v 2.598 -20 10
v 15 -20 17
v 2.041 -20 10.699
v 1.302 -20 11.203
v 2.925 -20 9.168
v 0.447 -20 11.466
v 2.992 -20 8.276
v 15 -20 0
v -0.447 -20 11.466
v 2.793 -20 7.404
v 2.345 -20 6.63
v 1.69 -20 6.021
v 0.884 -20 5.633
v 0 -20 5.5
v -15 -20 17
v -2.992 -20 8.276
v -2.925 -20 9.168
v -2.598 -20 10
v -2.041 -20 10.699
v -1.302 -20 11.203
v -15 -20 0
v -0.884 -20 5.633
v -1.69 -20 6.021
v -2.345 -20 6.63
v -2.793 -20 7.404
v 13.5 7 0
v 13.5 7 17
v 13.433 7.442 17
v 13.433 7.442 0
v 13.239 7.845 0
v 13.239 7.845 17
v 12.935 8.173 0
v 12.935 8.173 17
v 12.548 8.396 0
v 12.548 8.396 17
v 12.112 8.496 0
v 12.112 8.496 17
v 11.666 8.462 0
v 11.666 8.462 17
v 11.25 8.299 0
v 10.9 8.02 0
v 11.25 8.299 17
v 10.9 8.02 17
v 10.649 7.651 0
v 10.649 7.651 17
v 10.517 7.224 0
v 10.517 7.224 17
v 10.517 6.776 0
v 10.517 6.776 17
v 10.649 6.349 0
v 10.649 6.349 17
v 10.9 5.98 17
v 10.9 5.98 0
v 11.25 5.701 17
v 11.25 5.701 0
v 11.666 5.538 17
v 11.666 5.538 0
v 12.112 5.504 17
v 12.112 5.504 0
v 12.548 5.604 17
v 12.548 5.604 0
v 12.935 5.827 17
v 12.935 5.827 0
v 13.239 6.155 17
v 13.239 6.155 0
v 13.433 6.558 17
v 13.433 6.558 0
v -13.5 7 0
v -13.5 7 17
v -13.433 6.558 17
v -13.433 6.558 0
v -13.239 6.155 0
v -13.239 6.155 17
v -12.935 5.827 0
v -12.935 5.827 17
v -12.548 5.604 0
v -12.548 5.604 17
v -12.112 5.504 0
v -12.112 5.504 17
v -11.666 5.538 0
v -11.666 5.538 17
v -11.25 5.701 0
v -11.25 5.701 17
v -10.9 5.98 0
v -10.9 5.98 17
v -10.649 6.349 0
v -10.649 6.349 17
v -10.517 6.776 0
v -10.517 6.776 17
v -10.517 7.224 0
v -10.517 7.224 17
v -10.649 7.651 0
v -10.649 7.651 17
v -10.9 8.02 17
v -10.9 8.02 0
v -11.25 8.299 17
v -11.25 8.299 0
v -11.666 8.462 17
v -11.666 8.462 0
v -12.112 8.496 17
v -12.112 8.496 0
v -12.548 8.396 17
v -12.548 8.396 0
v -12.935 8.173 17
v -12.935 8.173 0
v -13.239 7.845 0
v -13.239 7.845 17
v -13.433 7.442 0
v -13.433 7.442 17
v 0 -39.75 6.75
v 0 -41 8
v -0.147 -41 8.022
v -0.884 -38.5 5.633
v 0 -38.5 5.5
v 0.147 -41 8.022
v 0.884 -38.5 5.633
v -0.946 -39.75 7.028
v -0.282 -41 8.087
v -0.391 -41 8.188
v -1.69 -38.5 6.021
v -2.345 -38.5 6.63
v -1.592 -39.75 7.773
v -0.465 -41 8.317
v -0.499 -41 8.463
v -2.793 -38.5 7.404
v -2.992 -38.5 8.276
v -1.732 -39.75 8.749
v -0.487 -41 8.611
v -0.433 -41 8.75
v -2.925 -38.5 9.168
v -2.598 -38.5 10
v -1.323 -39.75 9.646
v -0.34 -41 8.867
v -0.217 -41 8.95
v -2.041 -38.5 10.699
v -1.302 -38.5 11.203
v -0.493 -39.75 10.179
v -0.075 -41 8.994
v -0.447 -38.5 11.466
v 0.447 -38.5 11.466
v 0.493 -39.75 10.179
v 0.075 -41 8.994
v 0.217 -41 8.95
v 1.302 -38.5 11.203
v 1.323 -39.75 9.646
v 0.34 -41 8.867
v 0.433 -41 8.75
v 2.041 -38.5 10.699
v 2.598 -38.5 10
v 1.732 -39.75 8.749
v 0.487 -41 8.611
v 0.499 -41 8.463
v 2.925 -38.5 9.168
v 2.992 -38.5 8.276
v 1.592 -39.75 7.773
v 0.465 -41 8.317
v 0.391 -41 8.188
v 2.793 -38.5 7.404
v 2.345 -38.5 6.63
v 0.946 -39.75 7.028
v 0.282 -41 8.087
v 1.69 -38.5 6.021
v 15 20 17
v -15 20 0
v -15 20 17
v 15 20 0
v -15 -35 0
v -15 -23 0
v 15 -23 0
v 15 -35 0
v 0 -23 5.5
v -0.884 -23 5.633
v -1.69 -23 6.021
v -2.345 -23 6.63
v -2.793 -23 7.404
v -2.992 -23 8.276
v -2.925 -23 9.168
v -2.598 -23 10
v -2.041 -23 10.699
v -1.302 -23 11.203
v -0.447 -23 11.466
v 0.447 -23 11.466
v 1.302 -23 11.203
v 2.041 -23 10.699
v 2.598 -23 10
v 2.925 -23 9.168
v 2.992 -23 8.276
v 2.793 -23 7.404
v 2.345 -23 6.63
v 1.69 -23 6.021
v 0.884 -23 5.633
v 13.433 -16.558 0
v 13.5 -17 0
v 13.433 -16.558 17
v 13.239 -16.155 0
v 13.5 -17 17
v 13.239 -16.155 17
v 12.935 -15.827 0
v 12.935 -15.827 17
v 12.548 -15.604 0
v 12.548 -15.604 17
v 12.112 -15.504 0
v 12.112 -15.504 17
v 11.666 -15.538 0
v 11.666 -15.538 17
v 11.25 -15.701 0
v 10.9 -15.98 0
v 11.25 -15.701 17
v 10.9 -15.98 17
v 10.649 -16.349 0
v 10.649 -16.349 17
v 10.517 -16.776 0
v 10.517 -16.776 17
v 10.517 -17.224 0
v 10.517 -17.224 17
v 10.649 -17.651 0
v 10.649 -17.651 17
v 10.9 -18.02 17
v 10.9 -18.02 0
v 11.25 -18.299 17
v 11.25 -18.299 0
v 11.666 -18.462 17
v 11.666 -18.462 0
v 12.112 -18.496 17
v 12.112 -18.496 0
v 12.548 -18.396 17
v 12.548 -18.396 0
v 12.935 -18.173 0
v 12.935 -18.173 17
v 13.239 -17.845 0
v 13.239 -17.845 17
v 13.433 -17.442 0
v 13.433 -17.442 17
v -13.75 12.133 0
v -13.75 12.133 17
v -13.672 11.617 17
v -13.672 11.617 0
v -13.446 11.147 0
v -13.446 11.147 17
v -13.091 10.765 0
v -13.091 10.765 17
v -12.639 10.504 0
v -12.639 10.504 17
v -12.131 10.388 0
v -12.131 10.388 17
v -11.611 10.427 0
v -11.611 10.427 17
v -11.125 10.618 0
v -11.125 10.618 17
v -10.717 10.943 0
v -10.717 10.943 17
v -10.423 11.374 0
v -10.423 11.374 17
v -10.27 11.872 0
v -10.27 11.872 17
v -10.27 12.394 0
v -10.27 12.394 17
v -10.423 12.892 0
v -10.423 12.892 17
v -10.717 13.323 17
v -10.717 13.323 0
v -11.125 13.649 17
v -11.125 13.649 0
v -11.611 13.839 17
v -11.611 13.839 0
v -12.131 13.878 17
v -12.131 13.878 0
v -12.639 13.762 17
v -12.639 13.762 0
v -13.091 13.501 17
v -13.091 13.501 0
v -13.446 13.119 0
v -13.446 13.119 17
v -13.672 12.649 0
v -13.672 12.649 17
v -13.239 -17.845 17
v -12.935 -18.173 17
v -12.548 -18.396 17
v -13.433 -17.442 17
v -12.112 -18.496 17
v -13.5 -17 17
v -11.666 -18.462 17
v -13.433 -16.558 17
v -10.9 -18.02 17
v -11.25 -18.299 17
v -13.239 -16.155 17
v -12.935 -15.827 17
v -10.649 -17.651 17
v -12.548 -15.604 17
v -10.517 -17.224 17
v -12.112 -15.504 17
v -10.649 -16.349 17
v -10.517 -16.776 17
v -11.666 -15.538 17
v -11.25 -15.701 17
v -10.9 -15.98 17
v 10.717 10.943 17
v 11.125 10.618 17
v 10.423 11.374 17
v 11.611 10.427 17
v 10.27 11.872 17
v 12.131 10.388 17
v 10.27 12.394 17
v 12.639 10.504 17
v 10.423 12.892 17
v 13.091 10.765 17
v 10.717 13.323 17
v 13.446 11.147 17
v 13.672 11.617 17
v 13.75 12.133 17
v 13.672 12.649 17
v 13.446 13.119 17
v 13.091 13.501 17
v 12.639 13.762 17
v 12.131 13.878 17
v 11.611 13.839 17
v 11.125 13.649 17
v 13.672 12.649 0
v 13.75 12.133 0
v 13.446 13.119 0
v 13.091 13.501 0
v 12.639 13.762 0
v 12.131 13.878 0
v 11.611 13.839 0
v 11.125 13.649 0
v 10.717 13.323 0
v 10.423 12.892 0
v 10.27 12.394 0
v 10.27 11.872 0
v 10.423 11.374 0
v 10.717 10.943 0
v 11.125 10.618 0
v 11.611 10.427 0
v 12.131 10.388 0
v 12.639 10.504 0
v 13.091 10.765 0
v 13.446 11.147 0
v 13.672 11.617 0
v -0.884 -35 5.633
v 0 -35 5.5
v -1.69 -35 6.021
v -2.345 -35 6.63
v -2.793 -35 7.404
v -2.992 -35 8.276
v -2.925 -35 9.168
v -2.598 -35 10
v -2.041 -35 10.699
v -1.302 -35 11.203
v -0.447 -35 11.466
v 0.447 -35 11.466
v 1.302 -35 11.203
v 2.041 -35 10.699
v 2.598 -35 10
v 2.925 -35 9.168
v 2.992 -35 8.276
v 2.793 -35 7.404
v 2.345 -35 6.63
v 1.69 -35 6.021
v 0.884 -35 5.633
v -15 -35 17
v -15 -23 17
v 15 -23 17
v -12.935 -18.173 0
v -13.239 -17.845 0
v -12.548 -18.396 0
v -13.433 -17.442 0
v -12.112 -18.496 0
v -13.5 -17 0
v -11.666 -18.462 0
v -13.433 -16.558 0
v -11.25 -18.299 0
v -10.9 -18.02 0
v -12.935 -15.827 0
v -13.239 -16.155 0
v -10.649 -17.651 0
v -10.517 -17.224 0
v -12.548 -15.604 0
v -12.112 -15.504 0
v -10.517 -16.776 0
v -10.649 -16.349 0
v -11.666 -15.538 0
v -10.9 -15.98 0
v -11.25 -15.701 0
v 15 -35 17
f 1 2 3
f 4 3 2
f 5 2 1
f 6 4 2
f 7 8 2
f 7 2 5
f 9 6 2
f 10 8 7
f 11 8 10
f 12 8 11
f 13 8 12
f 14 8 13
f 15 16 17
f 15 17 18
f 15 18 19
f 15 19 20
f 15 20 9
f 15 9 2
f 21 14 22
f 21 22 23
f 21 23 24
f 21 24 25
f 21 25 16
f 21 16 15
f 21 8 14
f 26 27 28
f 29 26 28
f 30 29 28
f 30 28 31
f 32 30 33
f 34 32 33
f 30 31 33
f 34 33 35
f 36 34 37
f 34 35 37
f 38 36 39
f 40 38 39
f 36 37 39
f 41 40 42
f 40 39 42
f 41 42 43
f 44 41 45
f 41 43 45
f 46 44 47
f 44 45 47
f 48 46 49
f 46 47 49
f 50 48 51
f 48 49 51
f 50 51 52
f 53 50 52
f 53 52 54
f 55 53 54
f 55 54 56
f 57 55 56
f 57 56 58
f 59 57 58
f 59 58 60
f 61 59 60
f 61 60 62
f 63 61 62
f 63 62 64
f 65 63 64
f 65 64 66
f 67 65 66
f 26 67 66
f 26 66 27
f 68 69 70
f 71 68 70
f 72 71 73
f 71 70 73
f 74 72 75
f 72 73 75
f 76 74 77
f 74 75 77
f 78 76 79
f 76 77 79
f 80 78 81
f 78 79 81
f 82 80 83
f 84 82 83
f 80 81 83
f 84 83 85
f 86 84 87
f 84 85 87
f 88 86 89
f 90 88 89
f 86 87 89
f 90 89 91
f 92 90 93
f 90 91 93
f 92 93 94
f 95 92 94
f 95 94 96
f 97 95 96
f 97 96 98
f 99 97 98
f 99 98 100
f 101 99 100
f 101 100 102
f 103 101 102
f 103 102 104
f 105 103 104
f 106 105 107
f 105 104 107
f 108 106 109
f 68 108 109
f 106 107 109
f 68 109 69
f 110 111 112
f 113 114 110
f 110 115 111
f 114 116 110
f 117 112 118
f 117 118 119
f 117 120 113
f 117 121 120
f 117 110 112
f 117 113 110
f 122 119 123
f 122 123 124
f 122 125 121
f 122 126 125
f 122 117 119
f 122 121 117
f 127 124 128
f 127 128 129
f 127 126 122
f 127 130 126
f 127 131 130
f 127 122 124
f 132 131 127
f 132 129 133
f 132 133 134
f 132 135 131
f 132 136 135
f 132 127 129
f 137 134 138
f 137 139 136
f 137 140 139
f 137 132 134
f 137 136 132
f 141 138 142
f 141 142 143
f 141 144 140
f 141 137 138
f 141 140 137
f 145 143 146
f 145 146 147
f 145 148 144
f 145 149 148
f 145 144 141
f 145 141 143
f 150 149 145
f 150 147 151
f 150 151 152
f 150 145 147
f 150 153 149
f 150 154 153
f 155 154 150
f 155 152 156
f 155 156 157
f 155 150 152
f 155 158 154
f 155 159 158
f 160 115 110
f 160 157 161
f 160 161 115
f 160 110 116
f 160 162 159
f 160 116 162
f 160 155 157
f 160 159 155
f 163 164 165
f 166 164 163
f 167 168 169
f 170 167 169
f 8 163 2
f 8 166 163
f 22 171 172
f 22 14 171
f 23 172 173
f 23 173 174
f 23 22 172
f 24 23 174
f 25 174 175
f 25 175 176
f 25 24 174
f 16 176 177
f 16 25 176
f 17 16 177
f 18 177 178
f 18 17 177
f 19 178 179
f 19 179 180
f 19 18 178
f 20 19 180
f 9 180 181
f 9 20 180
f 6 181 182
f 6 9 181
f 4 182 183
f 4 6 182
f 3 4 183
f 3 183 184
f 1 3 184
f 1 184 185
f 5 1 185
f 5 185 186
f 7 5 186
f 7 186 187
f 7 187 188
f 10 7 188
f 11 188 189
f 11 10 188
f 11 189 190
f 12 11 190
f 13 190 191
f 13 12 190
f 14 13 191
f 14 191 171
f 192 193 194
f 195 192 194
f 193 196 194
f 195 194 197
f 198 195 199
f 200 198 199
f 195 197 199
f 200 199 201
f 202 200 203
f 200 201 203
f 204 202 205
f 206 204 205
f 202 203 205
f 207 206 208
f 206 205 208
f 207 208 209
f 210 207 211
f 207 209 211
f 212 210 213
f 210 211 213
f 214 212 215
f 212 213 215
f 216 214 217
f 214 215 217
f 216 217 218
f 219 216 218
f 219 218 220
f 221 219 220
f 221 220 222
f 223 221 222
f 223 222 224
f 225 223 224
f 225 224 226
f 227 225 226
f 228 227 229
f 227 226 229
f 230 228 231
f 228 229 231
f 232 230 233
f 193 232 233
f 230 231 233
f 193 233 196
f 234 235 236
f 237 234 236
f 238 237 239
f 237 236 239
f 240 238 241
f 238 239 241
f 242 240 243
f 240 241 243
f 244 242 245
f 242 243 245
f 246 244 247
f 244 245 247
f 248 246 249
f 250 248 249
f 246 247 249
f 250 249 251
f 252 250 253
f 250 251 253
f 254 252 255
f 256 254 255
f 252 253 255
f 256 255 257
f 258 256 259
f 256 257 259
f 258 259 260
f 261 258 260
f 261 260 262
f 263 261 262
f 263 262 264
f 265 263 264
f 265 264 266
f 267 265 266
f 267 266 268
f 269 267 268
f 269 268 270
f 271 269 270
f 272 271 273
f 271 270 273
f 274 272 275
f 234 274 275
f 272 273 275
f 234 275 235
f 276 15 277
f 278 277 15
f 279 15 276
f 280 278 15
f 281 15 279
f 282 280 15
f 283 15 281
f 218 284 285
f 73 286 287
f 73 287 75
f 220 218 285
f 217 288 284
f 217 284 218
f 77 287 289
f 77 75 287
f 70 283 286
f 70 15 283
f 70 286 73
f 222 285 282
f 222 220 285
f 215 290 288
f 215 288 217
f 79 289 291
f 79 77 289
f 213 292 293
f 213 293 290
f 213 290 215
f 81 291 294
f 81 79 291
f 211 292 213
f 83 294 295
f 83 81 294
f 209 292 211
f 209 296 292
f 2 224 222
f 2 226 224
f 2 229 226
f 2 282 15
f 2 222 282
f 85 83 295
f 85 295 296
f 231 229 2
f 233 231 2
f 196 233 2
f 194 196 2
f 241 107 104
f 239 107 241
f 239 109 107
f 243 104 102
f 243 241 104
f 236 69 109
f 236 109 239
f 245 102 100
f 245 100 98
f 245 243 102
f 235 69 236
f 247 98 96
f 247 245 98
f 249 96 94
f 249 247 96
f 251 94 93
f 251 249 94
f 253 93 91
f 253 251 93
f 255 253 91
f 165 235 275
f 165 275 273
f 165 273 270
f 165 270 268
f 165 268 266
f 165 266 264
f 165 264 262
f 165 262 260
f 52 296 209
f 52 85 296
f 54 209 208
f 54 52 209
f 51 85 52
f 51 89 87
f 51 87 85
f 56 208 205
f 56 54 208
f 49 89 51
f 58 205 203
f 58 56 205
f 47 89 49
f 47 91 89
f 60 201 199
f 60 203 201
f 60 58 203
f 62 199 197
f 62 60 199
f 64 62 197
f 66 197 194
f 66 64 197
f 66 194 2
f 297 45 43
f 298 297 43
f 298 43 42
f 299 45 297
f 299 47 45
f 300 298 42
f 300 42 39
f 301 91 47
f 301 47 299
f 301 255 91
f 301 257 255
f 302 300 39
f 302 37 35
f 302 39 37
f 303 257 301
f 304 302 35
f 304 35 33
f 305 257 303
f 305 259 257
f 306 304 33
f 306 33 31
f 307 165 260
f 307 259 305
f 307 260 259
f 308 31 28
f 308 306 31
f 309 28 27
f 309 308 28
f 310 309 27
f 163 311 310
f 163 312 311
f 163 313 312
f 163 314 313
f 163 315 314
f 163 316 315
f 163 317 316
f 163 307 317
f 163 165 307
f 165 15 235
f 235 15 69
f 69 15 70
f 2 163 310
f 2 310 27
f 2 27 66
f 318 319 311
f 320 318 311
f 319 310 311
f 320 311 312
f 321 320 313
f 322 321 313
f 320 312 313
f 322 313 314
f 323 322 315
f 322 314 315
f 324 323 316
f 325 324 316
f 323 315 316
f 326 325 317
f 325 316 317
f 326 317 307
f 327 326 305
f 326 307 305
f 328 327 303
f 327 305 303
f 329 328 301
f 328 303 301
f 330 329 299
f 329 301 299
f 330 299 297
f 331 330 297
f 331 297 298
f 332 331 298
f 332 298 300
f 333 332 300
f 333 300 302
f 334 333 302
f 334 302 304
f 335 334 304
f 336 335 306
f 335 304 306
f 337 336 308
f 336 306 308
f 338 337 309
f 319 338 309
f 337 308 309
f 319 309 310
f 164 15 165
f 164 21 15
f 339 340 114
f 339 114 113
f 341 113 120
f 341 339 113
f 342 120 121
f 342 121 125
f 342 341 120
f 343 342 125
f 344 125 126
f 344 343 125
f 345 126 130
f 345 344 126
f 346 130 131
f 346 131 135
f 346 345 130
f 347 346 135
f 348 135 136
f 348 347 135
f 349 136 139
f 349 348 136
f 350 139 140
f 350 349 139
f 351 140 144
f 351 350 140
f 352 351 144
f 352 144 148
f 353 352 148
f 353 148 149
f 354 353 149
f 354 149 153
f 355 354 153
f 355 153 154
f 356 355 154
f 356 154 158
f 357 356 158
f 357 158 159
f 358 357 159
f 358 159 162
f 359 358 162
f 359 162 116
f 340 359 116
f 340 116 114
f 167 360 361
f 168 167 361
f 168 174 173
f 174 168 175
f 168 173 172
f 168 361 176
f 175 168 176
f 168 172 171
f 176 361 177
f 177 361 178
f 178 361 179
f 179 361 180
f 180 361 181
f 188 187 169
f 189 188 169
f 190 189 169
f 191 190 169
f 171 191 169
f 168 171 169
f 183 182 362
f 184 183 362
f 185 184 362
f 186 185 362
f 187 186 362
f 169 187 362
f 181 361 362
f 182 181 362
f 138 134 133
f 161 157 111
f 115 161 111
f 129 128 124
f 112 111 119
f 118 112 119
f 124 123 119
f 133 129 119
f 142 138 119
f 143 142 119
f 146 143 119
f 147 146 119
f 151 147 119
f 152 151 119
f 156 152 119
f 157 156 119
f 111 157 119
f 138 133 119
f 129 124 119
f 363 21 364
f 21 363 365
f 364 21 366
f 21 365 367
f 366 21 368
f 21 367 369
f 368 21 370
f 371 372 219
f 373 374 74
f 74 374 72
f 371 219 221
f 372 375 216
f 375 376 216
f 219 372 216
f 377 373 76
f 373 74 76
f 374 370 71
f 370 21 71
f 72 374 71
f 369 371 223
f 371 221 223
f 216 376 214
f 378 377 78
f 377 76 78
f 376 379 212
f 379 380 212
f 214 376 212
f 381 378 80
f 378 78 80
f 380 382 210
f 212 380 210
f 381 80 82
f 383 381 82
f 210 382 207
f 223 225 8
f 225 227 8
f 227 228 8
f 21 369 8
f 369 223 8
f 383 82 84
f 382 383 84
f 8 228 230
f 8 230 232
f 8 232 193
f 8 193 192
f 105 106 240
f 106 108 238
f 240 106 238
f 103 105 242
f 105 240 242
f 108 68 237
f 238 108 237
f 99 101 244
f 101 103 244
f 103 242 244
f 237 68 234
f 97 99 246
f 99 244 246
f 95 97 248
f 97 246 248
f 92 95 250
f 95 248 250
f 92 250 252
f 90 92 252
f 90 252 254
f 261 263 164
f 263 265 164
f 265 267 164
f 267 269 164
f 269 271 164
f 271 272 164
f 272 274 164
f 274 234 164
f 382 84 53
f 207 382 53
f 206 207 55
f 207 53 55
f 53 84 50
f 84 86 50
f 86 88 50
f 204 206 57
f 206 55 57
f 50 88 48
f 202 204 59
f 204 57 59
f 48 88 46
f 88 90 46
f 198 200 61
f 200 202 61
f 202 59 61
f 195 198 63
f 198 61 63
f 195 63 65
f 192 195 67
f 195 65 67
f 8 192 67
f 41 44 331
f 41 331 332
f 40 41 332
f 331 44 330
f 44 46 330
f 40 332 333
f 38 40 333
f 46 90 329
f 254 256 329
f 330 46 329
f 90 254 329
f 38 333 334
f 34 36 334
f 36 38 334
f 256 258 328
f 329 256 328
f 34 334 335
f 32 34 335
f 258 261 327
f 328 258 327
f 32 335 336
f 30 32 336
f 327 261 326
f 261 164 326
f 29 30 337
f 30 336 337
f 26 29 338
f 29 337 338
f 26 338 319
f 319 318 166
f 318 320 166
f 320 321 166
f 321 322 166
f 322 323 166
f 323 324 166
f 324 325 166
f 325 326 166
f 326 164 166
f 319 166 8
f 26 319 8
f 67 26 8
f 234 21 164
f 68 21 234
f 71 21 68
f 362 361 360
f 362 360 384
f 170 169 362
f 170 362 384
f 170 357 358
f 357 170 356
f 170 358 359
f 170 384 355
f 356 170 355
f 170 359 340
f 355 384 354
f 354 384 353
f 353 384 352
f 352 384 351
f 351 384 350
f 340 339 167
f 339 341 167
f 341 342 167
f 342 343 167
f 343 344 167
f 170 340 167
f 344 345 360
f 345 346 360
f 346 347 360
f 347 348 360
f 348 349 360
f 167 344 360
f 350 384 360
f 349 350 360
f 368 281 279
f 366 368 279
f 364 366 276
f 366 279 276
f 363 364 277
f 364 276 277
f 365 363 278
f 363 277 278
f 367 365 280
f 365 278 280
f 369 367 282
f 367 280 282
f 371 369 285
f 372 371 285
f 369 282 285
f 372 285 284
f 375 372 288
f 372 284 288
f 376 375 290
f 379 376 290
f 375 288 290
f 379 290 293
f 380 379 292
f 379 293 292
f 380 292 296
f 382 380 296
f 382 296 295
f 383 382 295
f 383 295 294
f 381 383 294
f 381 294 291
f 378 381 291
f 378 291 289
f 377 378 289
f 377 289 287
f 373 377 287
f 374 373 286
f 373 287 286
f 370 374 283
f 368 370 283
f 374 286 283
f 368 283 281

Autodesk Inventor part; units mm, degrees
ref_plane "YZ Plane" through (0, 0, 0) normal (1, 0, 0) x (0, 1, 0)
ref_plane "XZ Plane" through (0, 0, 0) normal (0, 1, 0) x (-1, 0, 0)
ref_plane "XY Plane" through (0, 0, 0) normal (0, 0, 1) x (1, 0, 0)
sketch "Boceto1" plane through (0, 0, 0) normal (0, 0, 1) x (1, 0, 0)
  line L0 (-15, 20) -> (15, 20)
  line L1 (15, 20) -> (15, -20)
  line L2 (15, -20) -> (-15, -20)
  line L3 (-15, -20) -> (-15, 20)
  line L4 (5.2741, 0) -> (0, 0)
  line L5 (0, 0) -> (0, 2.4047)
  dimension "d0" = 30
  dimension "d1" = 40
extrude "Extrusión1" add sketch "Boceto1" along normal blind 17
sketch "Boceto2" plane through (0, 0, 17) normal (0, 0, 1) x (1, 0, 0)
  circle A0 centre (12, -17) radius 1.5
  line L0 (15, -20) -> (15, 20) projected
  line L1 (-15, -20) -> (15, -20) projected
  circle A1 centre (12, 7) radius 1.5
  circle A2 centre (12, 12.1331) radius 1.75
  point P0 (0, 0)
  dimension "d4" = 3
  dimension "d5" = 3
  dimension "d6" = 3
  dimension "d7" = 3
  dimension "d8" = 3
  dimension "d9" = 24
  dimension "d10" = 3.5
  dimension "d11" = 3
extrude "Extrusión2" cut sketch "Boceto2" against normal through all
mirror "Simetría1" about plane through (0, 0, 0) normal (1, 0, 0) of "Extrusión2"
sketch "Boceto3" plane through (0, 0, 17) normal (0, 0, 1) x (1, 0, 0)
  line L0 (-15, -23) -> (15, -23)
  line L1 (15, -23) -> (15, -35)
  line L2 (15, -35) -> (-15, -35)
  line L3 (-15, -35) -> (-15, -23)
  line L4 (-15, -20) -> (15, -20) projected
  point P0 (0, 0)
  dimension "d14" = 12
  dimension "d22" = 3
extrude "Extrusión3" add sketch "Boceto3" against normal up to surface (17 mm away)
sketch "Boceto4" plane through (0, 0, 0) normal (1, 0, 0) x (0, 1, 0)
  line L0 (-38.5, 5.5) -> (-35, 5.5)
  line L1 (-35, 17) -> (-35, 0) projected
  line L2 (-23, 0) -> (-35, 0) projected
  line L3 (-23, 17) -> (-23, 0) projected
  line L4 (-23, 5.5) -> (-20, 5.5)
  line L5 (-20, 0) -> (-20, 17) projected
  line L6 (-41, 8.5) -> (-20, 8.5)
  line L7 (-41, 8.5) -> (-41, 8)
  line L8 (-41, 8) -> (-38.5, 5.5)
  point P0 (0, 0)
  point P1 (-35, 8.5)
  point P2 (-23, 8.5)
  dimension "d18" = 6
  dimension "d19" = 3
  dimension "d20" = 8.5
  dimension "d23" = 0.5
  dimension "d24" = 135
revolve "Revolución1" add sketch "Boceto4" angle 360 about axis through (0, -41, 8.5) along (0, 1, 0) contours L8 L7 L6 L1 L0 | L6 L5 L4 L3
equation "\"d7\" = d4"
equation "\"d8\" = d5"
equation "\"d11\" = d8"
properties part number "NF TC-02" material "Cobre, aleado"
